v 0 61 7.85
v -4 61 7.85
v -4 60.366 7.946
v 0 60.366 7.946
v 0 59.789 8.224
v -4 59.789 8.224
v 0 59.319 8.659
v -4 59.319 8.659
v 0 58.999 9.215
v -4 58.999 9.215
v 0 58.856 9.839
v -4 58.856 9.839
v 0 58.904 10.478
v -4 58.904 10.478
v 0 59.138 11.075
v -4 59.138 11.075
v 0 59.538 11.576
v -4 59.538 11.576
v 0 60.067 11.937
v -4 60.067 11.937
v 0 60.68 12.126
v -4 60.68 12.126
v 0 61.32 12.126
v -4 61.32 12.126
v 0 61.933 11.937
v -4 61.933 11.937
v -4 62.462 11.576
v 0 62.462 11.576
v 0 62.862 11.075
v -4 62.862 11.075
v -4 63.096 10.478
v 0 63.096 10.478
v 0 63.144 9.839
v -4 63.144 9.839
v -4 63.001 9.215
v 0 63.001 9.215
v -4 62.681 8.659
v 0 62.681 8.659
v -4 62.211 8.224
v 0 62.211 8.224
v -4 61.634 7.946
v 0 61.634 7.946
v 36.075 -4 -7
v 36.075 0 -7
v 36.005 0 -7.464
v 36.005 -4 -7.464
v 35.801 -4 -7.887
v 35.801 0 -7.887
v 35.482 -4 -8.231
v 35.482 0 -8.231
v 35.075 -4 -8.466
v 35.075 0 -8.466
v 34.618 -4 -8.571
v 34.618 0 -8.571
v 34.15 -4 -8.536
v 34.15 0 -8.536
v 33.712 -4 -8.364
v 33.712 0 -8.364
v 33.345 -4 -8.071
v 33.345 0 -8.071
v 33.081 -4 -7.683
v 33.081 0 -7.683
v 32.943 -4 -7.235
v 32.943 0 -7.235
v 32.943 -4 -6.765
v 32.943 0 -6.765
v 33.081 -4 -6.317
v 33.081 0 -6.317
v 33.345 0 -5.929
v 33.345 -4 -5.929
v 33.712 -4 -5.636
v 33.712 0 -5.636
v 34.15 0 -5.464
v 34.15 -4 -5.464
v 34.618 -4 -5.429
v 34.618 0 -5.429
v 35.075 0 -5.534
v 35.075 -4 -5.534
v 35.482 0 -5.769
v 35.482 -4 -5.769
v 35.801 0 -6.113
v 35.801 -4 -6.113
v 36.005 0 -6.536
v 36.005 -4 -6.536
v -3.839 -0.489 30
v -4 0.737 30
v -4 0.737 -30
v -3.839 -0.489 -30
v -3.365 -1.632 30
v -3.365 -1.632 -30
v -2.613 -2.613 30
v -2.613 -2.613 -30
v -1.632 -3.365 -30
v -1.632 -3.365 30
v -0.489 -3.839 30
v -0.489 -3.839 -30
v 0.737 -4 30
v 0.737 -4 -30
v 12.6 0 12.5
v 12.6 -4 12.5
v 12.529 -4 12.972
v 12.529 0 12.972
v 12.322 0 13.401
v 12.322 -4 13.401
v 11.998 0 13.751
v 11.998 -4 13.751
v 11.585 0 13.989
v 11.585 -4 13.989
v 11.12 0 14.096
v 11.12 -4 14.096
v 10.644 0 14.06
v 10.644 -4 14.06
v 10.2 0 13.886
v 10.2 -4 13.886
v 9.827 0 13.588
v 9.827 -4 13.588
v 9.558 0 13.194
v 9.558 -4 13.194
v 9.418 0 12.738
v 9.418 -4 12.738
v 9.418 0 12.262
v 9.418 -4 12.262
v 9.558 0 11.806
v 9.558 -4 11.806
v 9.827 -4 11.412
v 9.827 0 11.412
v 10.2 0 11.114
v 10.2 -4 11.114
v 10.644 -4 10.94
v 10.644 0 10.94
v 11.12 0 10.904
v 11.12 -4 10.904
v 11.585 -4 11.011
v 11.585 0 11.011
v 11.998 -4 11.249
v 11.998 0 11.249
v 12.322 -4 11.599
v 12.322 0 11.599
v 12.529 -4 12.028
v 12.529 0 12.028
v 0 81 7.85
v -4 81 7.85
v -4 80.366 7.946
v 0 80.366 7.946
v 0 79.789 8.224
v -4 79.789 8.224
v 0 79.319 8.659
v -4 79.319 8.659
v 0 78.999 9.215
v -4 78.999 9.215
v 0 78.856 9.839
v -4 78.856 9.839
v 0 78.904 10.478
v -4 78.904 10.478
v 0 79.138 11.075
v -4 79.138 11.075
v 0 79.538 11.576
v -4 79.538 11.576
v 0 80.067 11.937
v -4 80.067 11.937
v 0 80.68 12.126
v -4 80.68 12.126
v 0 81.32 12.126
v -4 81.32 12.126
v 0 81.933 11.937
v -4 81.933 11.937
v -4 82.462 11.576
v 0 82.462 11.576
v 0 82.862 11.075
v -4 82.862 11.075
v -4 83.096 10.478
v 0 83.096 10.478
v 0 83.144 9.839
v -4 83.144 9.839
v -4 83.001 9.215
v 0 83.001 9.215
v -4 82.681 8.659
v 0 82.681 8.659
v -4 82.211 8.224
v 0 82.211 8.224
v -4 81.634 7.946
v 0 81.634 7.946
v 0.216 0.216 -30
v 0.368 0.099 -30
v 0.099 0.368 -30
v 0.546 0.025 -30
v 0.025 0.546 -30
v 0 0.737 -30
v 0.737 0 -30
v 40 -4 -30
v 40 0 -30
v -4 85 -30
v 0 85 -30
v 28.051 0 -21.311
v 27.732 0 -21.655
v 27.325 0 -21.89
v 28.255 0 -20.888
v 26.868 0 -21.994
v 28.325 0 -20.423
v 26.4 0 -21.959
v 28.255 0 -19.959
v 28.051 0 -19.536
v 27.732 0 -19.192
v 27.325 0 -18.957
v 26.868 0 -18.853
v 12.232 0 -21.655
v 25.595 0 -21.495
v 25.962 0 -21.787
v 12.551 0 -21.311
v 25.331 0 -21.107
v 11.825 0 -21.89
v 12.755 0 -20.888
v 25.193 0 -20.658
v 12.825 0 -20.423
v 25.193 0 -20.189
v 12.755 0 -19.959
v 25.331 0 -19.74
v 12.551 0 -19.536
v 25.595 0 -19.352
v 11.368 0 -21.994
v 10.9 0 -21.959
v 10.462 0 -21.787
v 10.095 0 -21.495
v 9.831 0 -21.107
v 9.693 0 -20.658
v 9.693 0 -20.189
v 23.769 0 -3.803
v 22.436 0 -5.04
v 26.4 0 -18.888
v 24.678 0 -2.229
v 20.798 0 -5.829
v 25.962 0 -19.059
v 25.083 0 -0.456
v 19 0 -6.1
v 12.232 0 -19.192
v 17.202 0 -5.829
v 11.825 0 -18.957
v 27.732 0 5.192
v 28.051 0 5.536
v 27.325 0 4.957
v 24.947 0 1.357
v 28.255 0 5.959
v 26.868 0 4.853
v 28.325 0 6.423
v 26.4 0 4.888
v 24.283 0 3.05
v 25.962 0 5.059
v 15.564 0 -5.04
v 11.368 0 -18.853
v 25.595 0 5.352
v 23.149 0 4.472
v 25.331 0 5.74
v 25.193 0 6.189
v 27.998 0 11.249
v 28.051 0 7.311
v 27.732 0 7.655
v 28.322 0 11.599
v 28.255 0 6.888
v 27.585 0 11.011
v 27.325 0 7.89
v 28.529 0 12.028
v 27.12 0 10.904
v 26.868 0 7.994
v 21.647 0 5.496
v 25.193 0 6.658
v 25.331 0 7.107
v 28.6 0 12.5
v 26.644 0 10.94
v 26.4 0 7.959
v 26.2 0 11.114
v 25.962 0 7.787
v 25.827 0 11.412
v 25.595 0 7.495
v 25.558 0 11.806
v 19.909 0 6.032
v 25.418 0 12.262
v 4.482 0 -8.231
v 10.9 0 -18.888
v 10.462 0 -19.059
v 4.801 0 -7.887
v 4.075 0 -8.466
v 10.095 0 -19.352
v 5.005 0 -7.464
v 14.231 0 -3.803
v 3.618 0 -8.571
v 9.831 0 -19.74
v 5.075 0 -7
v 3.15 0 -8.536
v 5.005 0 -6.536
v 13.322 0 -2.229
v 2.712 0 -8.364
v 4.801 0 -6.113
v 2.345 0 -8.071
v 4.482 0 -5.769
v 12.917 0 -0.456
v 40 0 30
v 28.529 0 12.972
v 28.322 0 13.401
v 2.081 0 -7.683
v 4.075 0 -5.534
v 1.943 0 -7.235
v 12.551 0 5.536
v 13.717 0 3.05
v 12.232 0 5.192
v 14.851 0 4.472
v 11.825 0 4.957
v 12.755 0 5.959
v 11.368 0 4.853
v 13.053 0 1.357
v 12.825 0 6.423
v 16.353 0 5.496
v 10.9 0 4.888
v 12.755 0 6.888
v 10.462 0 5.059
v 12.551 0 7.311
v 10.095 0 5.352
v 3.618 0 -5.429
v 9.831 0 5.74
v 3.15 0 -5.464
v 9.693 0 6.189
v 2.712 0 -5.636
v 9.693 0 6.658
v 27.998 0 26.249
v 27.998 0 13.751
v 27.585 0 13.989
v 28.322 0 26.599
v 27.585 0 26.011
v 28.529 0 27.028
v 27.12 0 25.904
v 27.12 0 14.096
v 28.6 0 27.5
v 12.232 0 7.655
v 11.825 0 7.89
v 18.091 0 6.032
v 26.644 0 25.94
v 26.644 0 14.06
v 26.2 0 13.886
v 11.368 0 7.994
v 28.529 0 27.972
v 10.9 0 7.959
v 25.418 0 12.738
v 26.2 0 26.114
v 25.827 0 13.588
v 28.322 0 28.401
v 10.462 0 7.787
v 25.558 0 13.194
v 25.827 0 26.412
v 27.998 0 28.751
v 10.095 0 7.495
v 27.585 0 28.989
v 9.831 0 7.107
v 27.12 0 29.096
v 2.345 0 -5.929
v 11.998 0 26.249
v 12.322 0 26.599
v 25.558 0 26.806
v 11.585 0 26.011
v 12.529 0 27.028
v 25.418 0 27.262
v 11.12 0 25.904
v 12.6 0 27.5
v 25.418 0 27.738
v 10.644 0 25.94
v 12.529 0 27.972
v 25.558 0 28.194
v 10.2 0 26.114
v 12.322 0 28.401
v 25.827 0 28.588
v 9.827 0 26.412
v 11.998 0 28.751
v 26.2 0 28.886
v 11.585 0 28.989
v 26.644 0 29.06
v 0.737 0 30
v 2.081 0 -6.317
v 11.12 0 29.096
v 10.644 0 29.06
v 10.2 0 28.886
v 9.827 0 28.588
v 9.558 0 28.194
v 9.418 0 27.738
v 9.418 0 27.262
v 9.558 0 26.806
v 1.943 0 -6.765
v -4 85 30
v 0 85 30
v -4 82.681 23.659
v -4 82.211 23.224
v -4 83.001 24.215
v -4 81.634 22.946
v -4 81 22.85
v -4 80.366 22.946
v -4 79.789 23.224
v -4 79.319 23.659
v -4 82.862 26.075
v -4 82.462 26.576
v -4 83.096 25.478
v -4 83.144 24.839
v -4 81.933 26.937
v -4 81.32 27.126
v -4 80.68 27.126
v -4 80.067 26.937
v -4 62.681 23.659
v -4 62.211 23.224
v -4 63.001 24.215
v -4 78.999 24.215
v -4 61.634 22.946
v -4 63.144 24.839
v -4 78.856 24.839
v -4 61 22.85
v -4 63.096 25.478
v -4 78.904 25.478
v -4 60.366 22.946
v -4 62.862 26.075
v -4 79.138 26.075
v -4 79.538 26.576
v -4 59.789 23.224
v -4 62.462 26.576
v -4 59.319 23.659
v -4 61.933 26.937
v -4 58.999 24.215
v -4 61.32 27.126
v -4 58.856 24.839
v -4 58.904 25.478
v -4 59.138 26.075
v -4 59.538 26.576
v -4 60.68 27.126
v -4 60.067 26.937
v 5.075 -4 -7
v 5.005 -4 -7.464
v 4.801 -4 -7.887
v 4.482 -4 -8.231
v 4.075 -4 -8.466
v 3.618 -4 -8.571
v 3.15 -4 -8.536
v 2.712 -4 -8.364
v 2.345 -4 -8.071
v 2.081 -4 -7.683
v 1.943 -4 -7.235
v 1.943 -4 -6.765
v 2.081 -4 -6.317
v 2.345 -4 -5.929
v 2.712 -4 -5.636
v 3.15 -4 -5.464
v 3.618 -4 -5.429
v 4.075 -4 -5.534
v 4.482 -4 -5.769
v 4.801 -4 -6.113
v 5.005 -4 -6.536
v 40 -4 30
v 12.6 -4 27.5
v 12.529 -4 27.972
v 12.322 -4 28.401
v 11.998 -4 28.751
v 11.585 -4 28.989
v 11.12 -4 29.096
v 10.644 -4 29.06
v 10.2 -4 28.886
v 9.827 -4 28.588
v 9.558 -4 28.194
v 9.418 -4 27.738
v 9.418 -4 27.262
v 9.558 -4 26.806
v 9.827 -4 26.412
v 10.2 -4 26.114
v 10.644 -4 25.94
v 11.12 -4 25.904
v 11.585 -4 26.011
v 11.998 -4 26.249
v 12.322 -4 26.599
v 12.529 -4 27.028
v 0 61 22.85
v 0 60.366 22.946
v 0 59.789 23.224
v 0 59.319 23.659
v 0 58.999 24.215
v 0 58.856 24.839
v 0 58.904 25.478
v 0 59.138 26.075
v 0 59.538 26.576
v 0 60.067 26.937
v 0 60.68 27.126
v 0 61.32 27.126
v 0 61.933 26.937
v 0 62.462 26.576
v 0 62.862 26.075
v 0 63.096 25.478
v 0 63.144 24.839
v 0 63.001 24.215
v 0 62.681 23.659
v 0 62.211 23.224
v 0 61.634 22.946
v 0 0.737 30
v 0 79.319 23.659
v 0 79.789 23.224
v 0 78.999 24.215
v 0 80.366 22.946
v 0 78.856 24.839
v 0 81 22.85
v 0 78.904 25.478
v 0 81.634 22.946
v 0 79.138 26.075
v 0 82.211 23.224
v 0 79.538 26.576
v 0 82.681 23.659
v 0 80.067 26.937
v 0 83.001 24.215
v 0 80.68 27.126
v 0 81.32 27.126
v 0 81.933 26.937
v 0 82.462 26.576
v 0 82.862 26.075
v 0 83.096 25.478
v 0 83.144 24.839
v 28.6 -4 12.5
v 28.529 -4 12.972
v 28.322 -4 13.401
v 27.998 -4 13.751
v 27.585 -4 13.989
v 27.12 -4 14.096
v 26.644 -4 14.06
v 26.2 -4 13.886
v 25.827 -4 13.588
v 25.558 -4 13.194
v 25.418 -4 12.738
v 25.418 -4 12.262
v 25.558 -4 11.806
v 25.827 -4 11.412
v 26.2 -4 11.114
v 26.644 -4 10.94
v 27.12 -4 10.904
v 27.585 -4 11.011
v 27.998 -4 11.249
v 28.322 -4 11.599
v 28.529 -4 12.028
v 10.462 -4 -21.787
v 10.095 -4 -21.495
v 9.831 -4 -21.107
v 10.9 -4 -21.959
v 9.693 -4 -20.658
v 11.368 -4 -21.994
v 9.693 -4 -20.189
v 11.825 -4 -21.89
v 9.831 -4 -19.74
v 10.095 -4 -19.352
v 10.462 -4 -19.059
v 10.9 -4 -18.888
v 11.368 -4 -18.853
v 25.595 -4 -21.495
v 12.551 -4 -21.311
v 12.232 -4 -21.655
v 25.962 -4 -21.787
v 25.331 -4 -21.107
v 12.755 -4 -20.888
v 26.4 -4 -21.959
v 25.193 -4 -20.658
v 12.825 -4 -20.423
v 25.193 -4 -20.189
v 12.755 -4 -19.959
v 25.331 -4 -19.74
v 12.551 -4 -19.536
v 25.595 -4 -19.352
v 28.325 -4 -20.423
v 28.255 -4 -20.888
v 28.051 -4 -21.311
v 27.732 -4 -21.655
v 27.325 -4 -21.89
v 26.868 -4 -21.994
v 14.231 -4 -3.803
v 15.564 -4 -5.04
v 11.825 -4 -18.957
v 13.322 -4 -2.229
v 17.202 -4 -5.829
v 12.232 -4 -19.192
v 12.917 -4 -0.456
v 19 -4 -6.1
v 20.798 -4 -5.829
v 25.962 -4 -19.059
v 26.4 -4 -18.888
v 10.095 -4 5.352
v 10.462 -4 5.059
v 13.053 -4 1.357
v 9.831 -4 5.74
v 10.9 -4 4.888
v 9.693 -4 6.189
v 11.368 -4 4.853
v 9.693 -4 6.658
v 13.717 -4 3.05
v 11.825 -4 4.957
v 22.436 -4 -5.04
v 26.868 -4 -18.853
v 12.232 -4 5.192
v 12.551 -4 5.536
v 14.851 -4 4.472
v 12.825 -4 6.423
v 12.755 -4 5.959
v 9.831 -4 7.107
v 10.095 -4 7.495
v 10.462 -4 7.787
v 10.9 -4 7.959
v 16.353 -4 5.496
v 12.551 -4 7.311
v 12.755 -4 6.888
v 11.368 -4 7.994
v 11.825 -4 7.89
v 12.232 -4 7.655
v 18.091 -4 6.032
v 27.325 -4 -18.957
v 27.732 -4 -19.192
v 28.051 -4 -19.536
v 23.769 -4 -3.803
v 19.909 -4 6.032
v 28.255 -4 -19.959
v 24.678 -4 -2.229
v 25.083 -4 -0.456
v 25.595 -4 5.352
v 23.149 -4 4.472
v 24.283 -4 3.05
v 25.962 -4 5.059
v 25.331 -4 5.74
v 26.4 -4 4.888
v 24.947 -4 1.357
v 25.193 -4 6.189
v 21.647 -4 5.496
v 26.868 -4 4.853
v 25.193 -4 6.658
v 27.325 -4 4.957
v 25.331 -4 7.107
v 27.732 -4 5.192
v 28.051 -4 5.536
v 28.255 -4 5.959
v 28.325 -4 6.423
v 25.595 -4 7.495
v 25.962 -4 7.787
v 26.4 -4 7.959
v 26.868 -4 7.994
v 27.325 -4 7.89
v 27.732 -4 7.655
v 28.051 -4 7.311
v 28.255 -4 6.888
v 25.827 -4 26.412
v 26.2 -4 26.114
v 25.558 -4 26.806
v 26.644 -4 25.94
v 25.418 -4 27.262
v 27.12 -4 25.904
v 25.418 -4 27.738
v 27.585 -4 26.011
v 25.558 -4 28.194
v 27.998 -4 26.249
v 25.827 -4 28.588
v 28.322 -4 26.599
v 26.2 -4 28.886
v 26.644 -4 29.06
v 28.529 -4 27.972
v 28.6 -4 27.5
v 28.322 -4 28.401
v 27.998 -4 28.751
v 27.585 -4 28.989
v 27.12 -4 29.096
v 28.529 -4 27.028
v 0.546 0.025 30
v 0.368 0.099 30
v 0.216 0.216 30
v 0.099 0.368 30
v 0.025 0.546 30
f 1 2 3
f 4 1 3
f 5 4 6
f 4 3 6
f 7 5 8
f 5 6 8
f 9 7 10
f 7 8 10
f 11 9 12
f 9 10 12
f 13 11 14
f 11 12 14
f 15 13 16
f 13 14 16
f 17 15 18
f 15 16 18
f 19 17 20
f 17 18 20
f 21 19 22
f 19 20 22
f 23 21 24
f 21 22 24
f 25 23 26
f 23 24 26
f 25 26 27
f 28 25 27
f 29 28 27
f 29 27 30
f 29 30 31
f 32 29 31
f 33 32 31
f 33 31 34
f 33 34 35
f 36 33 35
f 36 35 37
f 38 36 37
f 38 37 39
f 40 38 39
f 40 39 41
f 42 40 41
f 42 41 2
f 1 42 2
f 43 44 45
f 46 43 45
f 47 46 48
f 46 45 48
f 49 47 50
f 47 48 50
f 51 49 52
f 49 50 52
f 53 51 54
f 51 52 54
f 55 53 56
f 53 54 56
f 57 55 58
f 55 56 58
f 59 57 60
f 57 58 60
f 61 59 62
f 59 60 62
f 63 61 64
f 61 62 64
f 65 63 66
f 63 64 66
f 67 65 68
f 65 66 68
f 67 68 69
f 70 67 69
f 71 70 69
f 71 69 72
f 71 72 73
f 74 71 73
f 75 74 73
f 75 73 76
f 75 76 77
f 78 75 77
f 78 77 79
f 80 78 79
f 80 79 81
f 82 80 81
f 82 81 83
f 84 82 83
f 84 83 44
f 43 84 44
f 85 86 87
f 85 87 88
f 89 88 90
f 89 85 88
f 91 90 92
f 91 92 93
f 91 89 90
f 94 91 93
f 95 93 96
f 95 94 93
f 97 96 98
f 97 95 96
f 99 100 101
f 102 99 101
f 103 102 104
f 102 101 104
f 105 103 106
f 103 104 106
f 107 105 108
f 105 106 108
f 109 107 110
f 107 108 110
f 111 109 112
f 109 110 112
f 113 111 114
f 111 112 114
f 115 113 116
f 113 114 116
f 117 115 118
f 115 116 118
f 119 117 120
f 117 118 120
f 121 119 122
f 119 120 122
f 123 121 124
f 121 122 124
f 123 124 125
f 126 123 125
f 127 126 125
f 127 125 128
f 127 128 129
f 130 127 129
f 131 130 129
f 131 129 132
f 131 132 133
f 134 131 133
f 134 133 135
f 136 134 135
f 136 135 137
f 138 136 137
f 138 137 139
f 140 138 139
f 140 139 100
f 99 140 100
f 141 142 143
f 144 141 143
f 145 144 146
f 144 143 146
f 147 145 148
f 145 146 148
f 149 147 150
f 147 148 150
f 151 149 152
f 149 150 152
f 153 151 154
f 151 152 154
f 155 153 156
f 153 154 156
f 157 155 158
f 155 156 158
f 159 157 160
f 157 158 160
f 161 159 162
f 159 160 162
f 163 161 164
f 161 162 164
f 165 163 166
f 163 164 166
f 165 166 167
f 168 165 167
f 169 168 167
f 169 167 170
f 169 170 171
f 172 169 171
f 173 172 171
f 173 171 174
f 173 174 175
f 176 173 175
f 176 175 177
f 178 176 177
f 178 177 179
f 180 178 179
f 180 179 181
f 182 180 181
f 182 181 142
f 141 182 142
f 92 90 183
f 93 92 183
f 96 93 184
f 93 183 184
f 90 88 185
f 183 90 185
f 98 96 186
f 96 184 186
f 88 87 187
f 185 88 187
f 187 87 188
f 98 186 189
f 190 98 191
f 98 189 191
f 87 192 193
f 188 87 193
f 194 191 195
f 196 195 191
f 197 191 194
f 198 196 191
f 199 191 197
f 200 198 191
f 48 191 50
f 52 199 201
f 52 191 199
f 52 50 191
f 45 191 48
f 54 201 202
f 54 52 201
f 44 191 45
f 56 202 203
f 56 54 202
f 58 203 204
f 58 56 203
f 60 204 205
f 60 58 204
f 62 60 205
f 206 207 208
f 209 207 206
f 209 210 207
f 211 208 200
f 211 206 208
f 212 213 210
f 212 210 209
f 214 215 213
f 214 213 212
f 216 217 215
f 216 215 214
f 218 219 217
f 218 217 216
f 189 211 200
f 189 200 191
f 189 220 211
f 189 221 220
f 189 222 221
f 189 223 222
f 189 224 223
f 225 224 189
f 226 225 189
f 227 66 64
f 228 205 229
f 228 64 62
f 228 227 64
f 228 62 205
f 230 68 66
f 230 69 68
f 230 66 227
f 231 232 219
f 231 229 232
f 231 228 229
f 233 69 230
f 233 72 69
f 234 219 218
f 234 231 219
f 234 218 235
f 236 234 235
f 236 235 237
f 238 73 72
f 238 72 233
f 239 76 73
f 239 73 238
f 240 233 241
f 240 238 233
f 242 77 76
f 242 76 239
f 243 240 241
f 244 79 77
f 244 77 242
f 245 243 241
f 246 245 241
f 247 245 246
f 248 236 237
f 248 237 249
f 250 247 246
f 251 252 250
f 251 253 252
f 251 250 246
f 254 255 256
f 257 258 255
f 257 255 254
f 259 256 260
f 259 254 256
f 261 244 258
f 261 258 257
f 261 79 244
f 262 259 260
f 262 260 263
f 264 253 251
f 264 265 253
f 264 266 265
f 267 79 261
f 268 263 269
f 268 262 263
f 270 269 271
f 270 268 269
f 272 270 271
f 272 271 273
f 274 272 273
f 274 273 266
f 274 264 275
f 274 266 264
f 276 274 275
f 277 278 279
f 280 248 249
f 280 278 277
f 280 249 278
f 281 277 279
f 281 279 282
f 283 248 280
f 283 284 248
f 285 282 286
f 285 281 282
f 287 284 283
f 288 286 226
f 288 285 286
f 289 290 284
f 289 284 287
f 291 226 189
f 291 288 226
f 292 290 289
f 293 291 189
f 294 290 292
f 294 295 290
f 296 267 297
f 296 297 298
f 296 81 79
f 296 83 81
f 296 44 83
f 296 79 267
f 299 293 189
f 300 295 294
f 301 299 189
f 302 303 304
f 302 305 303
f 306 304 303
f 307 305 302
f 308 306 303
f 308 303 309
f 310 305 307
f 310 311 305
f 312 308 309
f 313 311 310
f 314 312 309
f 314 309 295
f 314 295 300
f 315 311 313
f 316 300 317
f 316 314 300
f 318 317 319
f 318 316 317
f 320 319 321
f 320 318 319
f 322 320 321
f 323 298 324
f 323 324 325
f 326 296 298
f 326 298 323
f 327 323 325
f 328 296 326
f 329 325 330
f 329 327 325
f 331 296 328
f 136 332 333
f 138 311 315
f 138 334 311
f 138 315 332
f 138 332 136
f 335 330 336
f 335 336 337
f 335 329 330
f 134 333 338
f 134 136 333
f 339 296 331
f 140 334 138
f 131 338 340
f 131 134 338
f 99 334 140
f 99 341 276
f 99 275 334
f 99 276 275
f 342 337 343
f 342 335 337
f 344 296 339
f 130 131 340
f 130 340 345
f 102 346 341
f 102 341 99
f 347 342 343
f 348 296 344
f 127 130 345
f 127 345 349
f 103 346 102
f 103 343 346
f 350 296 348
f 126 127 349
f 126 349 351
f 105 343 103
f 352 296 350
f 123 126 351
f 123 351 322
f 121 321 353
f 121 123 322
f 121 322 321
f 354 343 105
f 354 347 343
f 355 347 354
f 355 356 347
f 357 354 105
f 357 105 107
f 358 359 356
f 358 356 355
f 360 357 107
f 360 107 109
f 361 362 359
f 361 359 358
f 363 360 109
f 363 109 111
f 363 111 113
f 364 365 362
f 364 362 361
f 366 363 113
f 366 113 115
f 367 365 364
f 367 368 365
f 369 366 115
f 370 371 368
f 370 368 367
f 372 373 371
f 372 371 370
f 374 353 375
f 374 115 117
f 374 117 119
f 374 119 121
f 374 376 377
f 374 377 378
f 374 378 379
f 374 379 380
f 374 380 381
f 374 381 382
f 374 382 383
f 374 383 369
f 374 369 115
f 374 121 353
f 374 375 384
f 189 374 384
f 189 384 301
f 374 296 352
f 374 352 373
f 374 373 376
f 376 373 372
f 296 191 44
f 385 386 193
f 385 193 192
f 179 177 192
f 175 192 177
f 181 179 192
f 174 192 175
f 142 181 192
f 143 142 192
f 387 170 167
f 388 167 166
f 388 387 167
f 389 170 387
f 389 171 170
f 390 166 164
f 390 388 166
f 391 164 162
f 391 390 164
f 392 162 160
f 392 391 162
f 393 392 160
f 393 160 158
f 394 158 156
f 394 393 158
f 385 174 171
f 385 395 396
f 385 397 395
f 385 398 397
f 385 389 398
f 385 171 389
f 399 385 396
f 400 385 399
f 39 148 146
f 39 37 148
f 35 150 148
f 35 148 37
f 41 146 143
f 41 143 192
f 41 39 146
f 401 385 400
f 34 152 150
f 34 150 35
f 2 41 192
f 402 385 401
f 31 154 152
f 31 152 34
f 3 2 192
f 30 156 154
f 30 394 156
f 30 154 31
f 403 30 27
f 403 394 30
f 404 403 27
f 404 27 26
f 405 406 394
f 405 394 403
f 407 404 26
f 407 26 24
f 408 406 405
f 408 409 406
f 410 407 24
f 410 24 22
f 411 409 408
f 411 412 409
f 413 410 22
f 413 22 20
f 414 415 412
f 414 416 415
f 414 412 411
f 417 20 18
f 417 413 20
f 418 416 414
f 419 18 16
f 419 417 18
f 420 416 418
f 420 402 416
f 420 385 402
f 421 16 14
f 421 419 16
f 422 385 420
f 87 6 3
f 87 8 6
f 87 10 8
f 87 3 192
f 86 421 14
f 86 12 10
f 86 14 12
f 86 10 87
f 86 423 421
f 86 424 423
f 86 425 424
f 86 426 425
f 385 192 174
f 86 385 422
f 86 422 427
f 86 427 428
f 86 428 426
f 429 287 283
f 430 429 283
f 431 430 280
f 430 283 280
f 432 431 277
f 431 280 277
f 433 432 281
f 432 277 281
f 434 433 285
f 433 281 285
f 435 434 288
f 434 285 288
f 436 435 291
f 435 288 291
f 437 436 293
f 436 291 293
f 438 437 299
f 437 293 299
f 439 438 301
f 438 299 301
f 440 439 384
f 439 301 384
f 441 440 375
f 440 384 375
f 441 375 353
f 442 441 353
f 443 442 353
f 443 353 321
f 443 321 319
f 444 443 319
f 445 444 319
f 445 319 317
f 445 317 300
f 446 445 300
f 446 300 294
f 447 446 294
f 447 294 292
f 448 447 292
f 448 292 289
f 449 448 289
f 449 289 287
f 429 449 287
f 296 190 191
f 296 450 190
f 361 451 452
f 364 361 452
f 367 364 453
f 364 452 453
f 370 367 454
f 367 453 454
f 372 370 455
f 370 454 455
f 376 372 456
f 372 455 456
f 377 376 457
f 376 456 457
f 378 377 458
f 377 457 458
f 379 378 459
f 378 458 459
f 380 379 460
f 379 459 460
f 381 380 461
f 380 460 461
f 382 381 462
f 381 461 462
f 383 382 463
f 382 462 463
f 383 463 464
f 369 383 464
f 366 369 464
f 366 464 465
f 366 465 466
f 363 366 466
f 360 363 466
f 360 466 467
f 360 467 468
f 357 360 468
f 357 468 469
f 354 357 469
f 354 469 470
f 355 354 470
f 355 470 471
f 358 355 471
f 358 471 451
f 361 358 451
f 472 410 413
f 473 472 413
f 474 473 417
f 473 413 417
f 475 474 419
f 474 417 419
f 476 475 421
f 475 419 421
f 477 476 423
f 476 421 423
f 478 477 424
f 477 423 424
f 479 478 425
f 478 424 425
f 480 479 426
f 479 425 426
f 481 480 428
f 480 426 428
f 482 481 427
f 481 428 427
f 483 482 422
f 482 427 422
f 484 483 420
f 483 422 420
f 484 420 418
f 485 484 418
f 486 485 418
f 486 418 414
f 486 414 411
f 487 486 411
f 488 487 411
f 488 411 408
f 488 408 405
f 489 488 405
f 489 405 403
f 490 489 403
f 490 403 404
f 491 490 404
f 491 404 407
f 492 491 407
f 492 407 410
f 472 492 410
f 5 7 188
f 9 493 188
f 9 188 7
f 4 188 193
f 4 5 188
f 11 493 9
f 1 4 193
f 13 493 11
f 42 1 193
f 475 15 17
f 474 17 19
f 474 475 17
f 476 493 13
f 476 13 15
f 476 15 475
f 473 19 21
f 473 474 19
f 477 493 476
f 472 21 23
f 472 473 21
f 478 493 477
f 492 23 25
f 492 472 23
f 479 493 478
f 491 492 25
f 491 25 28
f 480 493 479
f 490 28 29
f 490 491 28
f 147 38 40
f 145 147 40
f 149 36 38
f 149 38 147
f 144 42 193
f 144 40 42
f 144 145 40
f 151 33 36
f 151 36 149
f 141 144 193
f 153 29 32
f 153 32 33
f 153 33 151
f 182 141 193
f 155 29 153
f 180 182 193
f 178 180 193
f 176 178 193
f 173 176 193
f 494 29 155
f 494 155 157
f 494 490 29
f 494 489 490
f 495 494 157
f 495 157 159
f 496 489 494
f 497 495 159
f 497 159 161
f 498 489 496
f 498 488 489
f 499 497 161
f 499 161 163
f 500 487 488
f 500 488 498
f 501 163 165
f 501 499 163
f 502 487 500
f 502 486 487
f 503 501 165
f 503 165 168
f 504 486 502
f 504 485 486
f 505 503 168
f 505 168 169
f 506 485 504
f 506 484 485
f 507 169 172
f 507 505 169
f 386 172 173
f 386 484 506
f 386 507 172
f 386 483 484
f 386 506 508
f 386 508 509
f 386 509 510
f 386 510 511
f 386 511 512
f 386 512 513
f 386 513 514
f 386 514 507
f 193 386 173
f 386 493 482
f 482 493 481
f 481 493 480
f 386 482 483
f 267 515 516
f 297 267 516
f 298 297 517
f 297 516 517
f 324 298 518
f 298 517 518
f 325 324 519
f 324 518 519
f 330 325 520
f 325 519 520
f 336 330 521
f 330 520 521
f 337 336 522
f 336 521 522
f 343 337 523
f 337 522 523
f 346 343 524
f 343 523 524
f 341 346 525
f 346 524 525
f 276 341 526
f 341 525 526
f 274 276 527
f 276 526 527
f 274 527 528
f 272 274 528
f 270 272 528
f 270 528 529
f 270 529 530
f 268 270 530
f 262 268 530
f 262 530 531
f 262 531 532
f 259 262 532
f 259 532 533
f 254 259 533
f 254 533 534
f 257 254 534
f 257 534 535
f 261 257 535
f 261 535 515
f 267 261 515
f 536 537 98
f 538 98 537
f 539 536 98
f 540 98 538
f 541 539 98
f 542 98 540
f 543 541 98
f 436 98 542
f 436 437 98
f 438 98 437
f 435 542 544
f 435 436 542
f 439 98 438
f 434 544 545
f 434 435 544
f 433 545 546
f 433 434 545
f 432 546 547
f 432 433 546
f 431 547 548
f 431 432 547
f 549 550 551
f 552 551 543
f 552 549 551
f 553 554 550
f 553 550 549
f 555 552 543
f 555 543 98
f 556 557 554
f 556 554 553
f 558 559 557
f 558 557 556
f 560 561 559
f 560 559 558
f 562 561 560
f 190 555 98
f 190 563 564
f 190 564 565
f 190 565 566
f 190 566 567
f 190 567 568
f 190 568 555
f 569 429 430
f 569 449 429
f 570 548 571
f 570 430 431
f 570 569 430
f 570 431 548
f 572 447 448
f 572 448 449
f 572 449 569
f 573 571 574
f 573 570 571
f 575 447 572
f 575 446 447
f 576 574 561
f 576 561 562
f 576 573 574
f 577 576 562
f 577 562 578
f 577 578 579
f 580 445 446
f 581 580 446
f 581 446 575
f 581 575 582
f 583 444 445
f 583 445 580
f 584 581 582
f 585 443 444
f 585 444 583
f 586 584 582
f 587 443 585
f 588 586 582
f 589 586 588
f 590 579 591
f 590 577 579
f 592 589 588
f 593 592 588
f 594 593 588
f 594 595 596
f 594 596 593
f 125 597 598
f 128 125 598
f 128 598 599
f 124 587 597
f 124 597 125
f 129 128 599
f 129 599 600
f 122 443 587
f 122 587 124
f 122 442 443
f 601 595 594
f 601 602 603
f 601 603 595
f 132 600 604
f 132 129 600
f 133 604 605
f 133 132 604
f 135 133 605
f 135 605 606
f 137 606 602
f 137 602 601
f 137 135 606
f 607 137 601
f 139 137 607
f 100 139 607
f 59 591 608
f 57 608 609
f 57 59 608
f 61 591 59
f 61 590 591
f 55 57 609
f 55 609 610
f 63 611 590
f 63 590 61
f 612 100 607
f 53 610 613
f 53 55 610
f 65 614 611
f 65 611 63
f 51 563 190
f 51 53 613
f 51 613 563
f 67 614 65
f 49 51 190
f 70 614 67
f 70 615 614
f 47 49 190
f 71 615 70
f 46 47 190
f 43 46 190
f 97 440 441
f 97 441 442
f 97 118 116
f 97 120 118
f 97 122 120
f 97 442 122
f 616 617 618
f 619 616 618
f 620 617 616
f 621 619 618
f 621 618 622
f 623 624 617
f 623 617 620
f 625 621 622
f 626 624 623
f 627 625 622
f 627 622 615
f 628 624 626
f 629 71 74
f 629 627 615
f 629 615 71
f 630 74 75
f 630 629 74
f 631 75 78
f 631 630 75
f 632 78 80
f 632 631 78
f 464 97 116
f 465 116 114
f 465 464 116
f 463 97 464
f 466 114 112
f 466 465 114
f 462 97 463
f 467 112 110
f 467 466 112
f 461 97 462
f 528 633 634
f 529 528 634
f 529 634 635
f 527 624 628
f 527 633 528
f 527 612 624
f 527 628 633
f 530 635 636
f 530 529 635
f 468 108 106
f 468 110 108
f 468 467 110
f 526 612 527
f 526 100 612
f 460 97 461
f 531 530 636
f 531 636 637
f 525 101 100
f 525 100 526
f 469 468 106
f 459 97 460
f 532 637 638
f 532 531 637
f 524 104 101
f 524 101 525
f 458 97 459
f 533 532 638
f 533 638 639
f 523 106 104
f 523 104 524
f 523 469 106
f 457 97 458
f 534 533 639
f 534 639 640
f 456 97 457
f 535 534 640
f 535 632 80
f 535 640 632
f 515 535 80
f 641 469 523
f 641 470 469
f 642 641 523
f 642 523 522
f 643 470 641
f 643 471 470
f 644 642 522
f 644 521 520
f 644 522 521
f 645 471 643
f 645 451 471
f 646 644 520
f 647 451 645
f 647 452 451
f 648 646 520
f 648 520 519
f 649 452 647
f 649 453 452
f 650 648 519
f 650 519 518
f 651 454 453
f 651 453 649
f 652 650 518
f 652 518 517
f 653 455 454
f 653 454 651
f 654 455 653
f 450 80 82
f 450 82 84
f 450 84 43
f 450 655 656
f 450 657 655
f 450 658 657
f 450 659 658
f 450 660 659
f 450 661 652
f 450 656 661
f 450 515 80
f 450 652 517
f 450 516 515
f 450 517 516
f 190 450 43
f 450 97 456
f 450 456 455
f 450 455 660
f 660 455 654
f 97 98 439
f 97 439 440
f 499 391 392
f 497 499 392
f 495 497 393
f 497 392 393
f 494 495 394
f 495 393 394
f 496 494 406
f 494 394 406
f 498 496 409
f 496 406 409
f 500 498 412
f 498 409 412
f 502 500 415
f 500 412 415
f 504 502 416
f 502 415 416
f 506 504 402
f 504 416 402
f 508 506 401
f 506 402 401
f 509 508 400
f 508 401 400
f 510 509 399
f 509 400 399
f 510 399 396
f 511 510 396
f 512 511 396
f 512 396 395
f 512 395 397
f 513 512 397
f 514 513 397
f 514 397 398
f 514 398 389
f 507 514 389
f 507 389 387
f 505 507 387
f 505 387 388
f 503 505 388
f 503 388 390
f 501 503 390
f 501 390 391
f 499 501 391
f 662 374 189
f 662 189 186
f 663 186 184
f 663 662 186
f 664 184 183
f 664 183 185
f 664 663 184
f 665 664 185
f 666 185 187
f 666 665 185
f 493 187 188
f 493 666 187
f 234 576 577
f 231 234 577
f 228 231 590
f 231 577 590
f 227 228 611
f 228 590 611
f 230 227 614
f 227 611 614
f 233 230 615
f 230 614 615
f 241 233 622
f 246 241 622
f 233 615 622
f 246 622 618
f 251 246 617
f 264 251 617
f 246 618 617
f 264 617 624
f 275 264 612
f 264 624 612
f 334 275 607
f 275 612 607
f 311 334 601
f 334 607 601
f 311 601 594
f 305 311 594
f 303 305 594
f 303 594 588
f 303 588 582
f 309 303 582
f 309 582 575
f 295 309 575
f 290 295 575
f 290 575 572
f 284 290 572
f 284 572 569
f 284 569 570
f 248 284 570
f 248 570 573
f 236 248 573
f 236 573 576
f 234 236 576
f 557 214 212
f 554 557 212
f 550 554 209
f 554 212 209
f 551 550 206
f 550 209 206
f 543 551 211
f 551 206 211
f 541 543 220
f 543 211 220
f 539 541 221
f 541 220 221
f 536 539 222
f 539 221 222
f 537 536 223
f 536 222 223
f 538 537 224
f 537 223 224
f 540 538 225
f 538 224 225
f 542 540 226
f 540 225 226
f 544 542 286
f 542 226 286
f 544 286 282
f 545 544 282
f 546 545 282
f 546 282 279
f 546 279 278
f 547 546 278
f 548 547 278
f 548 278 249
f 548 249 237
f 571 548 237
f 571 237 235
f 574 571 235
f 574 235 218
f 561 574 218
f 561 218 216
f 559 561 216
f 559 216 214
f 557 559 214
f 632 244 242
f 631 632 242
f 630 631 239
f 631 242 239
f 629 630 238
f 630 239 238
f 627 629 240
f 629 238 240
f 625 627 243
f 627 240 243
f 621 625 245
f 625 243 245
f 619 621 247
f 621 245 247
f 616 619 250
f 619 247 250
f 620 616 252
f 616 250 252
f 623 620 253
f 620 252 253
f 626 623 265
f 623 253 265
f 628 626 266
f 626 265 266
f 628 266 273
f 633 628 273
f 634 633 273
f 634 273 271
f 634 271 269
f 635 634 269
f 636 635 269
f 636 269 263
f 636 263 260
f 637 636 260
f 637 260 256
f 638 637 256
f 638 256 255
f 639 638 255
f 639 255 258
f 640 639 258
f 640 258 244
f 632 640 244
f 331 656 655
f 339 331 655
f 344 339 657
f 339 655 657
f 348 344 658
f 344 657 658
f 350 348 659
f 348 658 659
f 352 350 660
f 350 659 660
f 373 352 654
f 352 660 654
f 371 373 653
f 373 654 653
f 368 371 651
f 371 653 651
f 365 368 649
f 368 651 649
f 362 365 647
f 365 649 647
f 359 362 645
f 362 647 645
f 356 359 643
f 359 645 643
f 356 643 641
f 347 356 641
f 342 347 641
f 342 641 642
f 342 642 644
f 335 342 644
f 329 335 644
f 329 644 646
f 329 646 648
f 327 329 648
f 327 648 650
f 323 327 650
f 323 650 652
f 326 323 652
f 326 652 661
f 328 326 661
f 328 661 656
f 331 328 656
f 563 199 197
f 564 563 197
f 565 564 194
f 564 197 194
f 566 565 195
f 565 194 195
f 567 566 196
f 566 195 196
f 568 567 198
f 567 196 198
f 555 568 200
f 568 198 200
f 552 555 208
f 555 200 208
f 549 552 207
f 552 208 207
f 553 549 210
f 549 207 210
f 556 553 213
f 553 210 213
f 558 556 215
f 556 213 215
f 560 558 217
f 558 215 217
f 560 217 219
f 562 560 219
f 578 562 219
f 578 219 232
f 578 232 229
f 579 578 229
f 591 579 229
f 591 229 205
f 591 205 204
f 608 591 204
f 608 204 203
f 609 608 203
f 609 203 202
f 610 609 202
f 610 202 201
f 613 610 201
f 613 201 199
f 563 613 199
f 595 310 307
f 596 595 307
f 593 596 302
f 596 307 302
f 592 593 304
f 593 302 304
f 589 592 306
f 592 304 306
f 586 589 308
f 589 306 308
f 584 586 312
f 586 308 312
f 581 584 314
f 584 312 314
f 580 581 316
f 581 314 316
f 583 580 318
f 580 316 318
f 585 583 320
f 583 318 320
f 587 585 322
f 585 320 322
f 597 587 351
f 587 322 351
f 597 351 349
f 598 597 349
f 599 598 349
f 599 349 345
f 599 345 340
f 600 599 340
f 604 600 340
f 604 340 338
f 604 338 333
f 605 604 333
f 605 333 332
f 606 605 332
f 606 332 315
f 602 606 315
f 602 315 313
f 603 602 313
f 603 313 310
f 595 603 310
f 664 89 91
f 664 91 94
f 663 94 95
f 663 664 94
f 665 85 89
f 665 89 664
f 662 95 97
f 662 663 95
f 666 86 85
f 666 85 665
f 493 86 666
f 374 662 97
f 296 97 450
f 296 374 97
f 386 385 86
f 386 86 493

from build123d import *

# Parameters (mm, degrees)
SM_BASE_FLANGE_2_DEPTH = 30
HOLE_WIZARD_M3_1_D     = 3.2
SKETCH_24_R            = 6.1
CUT_EXTRUDE_2_DEPTH    = 103.08329932
HOLE_WIZARD_M4_1_D     = 4.3
HOLE_WIZARD_M2_1_D     = 2.2
HOLE_WIZARD_M3_1_2_D   = 3.15


# Sheet-metal steps are written as plain solids
with BuildPart() as part:
    # 草圖16 → 基材-凸緣2 (new, symmetric)
    with BuildSketch(Plane.XY):
        with BuildLine():
            Line((40, 0), (0.7366, 0))
            ThreePointArc((0.7366, 0), (0.215745145, 0.215745145), (0, 0.7366))
            Line((0, 0.7366), (0, 85))
            Line((0, 85), (-4, 85))
            Line((-4, 85), (-4, 0.7366))
            ThreePointArc((-4, 0.7366), (-2.61268198, -2.61268198), (0.7366, -4))
            Line((0.7366, -4), (40, -4))
            Line((40, -4), (40, 0))
        make_face()
    extrude(amount=SM_BASE_FLANGE_2_DEPTH, both=True)

    # Hole Wizard M3 _1 (through all)
    with Locations(Plane(origin=(0, 0, 0), x_dir=(-1, 0, 0), z_dir=(0, 1, 0))):
        with Locations((-27, 27.5), (-11, 12.5), (-11, 27.5), (-27, 12.5)):
            Hole(HOLE_WIZARD_M3_1_D / 2)

    # 草圖24 → 除料-伸長2 (cut, through all)
    with BuildSketch(Plane.XZ.offset(4)):
        with Locations(Location((19, 0, 0), (0, 0, 270))):
            Circle(SKETCH_24_R)
    extrude(amount=-CUT_EXTRUDE_2_DEPTH, mode=Mode.SUBTRACT)

    # M4 餘隙孔1 (through all)
    with Locations(Plane(origin=(0, 0, 0), x_dir=(0, 0, 1), z_dir=(1, 0, 0))):
        with Locations((10, -81), (25, -81), (25, -61), (10, -61)):
            Hole(HOLE_WIZARD_M4_1_D / 2)

    # M2 餘隙孔1 (through all)
    with Locations(Plane(origin=(0, -4, 0), x_dir=(-1, 0, 0), z_dir=(0, -1, 0))):
        with Locations((-14, 0), (-24, 0)):
            Hole(HOLE_WIZARD_M2_1_D / 2)

    # Hole Wizard M3 _1 2 (through all)
    with Locations(Plane(origin=(0, -4, 0), x_dir=(-1, 0, 0), z_dir=(0, -1, 0))):
        with Locations((-26.75, -6.423393759), (-34.5, 7), (-3.5, 7), (-11.25, -6.423393759), (-11.25, 20.423393759), (-26.75, 20.423393759)):
            Hole(HOLE_WIZARD_M3_1_2_D / 2)


solid = part.part
